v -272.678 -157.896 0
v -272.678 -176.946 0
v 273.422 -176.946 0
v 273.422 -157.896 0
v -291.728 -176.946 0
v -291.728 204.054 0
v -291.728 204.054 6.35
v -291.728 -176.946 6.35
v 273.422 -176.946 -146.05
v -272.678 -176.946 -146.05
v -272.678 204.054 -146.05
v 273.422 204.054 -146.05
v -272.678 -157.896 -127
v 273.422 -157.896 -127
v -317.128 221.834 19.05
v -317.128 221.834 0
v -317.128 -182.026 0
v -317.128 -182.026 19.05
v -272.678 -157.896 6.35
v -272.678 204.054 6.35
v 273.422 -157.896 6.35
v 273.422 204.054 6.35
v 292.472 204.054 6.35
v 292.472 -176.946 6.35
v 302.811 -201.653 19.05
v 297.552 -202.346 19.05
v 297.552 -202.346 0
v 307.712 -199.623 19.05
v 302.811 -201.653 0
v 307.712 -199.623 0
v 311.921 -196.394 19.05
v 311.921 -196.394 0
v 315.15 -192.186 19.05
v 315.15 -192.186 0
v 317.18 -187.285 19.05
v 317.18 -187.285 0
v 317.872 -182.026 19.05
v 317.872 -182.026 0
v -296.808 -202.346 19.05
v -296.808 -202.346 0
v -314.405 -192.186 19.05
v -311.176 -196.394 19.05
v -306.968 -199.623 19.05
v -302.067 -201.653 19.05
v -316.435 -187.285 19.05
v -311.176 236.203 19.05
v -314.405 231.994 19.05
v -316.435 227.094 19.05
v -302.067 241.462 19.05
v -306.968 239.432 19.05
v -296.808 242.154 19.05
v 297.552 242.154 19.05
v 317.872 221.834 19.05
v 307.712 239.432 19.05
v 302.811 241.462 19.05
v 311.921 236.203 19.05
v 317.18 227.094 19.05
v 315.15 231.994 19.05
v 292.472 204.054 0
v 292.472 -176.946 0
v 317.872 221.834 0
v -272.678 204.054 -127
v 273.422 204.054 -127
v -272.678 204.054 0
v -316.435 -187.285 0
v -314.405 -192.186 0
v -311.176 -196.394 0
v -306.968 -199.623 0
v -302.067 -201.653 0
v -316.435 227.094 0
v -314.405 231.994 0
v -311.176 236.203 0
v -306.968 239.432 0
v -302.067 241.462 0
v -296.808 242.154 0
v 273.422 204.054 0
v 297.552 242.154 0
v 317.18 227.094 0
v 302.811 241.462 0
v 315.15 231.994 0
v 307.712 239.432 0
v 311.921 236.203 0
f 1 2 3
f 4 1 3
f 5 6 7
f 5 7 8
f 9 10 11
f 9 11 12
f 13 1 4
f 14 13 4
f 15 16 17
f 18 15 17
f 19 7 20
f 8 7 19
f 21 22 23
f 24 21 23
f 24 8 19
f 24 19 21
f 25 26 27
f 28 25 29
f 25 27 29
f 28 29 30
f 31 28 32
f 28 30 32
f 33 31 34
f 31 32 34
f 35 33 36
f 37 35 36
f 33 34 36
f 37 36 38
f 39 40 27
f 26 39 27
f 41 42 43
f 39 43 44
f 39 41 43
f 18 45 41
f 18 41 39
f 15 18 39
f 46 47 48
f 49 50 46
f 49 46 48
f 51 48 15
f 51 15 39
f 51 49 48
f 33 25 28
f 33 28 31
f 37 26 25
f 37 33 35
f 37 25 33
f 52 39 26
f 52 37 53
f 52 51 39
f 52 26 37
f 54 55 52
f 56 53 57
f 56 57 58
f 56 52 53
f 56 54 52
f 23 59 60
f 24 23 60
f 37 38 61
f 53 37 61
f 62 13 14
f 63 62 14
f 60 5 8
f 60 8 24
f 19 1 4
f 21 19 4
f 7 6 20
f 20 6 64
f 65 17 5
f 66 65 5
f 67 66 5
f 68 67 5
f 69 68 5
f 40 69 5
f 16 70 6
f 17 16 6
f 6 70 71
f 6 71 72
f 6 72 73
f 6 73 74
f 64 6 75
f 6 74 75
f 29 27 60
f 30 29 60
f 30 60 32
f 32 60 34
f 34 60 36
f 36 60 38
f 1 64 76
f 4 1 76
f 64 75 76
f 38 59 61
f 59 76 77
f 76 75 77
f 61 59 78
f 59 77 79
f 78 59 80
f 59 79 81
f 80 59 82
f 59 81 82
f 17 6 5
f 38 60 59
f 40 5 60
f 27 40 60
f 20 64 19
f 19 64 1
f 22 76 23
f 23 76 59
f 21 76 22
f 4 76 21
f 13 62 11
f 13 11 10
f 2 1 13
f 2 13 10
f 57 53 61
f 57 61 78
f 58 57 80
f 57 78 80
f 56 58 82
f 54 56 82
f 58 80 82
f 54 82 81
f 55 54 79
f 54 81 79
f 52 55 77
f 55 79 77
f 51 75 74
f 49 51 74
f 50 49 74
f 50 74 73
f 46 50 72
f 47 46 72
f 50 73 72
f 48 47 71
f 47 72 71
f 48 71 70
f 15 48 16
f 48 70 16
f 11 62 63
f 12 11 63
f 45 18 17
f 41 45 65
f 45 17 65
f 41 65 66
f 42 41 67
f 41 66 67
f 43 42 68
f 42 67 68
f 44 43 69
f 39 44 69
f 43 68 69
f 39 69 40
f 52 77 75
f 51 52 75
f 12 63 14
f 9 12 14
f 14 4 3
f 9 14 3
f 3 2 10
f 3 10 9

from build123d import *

# Parameters (mm, degrees)
F1_DEPTH  = 19.05
F2_W      = 19.05
F2_H      = 381
F3_DEPTH  = 6.35
F4_W      = 546.1
F4_H      = 19.05
F5_DEPTH  = 6.35
F6_W      = 19.05
F6_H      = 381
F7_DEPTH  = 6.35
F8_W      = 546.1
F8_H      = 19.05
F9_DEPTH  = 127
F10_W     = 546.1
F10_H     = 381
F11_DEPTH = 19.05


with BuildPart() as f1:
    # F0 (on Top) → F1 (new body)
    with BuildSketch(Plane.XY):
        with BuildLine():
            Line((297.552139, 242.154465), (-296.807861, 242.154465))
            ThreePointArc((-296.807861, 242.154465), (-311.176271, 236.202875), (-317.127861, 221.834465))
            Line((-317.127861, 221.834465), (-317.127861, -182.025535))
            ThreePointArc((-317.127861, -182.025535), (-311.176271, -196.393944), (-296.807861, -202.345535))
            Line((-296.807861, -202.345535), (297.552139, -202.345535))
            ThreePointArc((297.552139, -202.345535), (311.920549, -196.393944), (317.872139, -182.025535))
            Line((317.872139, -182.025535), (317.872139, 221.834465))
            ThreePointArc((317.872139, 221.834465), (311.920549, 236.202875), (297.552139, 242.154465))
        make_face()
    extrude(amount=F1_DEPTH)

    # F2 (on face) → F3 (cut)
    with BuildSketch(Plane(origin=(0, 0, 0), x_dir=(1, 0, 0), z_dir=(0, 0, -1))):
        with Locations((-282.202861, -13.554465)):
            Rectangle(F2_W, F2_H)
    extrude(amount=-F3_DEPTH, mode=Mode.SUBTRACT)

    # F4 (on face) → F5 (cut)
    with BuildSketch(Plane(origin=(0, 0, 0), x_dir=(1, 0, 0), z_dir=(0, 0, -1))):
        with Locations((0.372139, 167.420535)):
            Rectangle(F4_W, F4_H)
    extrude(amount=-F5_DEPTH, mode=Mode.SUBTRACT)

    # F6 (on face) → F7 (cut)
    with BuildSketch(Plane(origin=(0, 0, 0), x_dir=(1, 0, 0), z_dir=(0, 0, -1))):
        with Locations((282.947139, -13.554465)):
            Rectangle(F6_W, F6_H)
    extrude(amount=-F7_DEPTH, mode=Mode.SUBTRACT)


with BuildPart() as f9:
    # F8 (on face) → F9 (new body)
    with BuildSketch(Plane(origin=(0, 0, 0), x_dir=(1, 0, 0), z_dir=(0, 0, -1))):
        with Locations((0.372139, 167.420535)):
            Rectangle(F8_W, F8_H)
    extrude(amount=F9_DEPTH)

    # F10 (on face) → F11 (join)
    with BuildSketch(Plane(origin=(0, 0, -127), x_dir=(1, 0, 0), z_dir=(0, 0, -1))):
        with Locations((0.372139, -13.554465)):
            Rectangle(F10_W, F10_H)
    extrude(amount=F11_DEPTH)


solid = Compound([f1.part, f9.part])
